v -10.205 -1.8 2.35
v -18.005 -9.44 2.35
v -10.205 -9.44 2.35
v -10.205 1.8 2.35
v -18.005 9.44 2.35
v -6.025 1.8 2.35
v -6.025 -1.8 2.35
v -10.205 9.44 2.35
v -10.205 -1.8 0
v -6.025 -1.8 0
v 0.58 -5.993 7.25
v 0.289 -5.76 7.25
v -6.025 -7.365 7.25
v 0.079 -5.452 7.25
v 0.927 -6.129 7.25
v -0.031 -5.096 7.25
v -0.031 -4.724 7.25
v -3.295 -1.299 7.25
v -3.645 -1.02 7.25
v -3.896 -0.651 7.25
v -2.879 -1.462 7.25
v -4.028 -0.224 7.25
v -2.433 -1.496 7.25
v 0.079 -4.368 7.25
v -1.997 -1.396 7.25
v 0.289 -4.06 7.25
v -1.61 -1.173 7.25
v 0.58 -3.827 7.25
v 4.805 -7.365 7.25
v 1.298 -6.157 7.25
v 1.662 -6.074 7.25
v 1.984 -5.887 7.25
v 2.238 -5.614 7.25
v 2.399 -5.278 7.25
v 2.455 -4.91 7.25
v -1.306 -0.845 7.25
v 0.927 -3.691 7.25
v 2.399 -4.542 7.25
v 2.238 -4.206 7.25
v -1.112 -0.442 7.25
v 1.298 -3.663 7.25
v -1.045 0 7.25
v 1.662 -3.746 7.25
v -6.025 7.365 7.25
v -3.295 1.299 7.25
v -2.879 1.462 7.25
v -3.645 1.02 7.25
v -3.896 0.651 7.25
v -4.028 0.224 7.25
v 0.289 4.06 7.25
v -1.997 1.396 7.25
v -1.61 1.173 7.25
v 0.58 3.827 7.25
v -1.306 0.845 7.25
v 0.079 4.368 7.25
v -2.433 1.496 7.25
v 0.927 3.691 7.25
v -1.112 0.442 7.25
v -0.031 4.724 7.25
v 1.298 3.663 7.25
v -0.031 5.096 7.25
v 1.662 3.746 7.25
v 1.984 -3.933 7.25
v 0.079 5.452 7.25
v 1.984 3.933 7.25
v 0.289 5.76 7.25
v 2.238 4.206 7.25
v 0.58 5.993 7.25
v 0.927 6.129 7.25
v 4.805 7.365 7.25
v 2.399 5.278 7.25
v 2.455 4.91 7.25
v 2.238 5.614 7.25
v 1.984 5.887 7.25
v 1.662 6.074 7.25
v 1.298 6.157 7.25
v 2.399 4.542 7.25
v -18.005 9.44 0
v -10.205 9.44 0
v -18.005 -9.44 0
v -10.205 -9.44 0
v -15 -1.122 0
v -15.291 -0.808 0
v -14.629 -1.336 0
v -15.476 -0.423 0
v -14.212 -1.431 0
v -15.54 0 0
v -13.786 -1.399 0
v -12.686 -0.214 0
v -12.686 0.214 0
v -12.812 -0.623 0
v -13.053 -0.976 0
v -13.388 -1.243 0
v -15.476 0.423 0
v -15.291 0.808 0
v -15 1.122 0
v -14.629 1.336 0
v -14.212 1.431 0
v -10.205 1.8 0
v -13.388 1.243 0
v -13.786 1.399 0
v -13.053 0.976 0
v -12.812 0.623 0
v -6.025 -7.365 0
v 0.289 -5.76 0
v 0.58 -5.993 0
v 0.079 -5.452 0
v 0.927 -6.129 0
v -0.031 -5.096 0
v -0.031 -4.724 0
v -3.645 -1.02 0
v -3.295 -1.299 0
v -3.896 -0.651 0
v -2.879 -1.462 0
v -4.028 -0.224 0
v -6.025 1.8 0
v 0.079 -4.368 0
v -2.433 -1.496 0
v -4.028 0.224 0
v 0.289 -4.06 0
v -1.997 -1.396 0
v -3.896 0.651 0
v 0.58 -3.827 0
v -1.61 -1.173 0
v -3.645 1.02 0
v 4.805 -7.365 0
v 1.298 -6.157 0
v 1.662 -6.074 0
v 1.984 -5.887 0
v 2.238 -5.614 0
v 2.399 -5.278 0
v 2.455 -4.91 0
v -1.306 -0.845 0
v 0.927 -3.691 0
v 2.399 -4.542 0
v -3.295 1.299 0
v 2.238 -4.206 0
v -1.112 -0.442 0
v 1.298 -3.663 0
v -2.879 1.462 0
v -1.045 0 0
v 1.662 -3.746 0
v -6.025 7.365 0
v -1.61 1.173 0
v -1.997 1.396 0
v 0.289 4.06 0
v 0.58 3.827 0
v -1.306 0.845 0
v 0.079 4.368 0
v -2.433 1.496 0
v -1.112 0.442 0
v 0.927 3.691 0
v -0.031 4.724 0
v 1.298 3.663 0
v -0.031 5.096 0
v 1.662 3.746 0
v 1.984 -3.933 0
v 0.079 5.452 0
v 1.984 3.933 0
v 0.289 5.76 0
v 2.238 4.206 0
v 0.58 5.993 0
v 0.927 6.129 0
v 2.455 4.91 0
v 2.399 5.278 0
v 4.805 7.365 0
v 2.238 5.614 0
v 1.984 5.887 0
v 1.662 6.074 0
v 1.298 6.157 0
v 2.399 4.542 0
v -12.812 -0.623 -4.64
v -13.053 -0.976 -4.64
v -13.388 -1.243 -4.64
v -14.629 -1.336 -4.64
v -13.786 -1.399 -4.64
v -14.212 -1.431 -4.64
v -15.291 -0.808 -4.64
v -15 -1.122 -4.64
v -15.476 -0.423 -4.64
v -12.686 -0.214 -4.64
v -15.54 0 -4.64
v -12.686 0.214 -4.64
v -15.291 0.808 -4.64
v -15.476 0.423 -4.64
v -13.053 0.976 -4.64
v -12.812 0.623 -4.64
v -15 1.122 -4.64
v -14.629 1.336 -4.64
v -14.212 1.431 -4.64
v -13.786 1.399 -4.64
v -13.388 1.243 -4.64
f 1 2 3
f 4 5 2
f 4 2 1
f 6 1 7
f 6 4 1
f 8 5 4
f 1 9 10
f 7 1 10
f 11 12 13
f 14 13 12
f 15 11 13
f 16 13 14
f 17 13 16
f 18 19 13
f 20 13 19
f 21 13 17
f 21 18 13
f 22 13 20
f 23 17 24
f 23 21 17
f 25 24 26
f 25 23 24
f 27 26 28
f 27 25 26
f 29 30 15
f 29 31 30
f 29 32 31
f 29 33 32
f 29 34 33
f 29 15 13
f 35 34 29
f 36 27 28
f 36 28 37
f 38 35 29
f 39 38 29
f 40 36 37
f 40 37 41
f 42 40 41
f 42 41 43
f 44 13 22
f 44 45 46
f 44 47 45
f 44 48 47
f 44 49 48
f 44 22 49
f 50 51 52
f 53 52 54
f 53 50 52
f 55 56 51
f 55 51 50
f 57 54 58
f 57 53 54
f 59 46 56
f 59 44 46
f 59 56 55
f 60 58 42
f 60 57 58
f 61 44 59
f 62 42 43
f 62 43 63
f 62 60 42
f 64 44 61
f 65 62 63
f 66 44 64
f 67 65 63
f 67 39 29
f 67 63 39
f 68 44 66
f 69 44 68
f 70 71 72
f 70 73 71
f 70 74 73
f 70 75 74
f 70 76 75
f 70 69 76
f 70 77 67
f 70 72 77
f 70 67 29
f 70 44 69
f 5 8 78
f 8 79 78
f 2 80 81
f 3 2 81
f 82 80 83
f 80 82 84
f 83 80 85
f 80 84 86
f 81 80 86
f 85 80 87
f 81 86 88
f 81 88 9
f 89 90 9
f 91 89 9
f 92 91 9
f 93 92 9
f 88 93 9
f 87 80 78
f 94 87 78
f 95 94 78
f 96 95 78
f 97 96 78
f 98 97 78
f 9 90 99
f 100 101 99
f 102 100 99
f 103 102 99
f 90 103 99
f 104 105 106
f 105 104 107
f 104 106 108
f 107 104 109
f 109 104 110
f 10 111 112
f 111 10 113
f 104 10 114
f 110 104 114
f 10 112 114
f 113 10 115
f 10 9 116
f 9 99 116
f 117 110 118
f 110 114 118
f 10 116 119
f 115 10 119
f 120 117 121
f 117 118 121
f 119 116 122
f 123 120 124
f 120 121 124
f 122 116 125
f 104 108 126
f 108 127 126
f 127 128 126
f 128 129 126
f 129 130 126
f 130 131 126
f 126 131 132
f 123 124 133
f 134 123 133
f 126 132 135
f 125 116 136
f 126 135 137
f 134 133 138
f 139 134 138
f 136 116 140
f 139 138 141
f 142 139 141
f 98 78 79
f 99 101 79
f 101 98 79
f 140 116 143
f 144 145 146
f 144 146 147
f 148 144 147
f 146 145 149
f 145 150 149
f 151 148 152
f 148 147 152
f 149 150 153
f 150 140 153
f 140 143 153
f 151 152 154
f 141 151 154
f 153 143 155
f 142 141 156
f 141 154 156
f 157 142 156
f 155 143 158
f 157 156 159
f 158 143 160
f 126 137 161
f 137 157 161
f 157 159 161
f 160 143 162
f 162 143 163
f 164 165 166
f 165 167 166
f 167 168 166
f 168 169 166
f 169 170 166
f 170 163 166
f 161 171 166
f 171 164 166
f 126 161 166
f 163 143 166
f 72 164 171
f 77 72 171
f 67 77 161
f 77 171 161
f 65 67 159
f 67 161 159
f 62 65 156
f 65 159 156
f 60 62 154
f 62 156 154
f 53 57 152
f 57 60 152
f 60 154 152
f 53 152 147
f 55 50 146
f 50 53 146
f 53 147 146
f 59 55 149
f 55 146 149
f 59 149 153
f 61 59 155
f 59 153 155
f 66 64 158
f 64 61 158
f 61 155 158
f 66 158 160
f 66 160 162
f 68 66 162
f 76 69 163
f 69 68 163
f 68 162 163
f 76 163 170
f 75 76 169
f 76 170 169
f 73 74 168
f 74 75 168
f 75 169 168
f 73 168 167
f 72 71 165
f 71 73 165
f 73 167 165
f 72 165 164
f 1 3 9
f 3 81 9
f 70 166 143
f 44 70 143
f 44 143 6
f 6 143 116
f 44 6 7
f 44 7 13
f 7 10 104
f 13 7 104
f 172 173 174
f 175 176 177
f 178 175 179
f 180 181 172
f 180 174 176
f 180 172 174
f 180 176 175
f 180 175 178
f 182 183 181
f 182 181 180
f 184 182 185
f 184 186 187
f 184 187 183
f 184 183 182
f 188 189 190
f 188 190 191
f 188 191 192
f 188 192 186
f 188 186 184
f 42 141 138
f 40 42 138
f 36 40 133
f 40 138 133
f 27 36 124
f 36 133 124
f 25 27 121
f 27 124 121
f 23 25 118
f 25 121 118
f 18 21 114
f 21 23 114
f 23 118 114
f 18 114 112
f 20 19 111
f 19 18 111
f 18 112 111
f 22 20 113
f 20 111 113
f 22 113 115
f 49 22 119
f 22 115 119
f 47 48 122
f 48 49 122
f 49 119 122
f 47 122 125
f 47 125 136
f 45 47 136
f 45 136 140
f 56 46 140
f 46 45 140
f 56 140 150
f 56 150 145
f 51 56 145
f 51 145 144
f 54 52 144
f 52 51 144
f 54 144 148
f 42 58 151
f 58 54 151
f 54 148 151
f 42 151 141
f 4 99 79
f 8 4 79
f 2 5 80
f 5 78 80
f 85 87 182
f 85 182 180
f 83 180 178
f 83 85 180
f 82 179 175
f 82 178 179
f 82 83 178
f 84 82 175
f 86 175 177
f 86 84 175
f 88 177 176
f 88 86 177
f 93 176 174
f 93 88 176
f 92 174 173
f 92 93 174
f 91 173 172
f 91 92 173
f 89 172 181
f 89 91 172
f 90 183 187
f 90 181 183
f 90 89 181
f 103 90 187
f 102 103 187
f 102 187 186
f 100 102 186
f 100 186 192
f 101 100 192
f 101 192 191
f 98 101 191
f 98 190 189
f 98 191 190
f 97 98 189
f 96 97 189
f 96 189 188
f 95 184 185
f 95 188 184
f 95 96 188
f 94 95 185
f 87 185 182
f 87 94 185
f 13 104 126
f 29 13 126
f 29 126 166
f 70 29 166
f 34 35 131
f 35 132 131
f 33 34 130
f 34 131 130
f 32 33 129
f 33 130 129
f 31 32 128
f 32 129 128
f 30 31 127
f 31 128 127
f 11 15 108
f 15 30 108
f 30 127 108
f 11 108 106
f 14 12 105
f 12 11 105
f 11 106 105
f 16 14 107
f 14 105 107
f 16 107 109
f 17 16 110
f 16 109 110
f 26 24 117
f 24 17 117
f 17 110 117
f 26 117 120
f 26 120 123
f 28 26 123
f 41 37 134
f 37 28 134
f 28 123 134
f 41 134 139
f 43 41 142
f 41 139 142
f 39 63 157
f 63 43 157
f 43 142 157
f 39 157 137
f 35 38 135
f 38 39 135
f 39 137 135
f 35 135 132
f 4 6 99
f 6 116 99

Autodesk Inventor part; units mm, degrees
ref_plane "YZ Plane" through (0, 0, 0) normal (1, 0, 0) x (0, 1, 0)
ref_plane "XZ Plane" through (0, 0, 0) normal (0, 1, 0) x (-1, 0, 0)
ref_plane "XY Plane" through (0, 0, 0) normal (0, 0, 1) x (1, 0, 0)
sketch "Skizze1" plane through (0, 0, 0) normal (0, 0, 1) x (1, 0, 0)
  circle A0 centre (-2.545, 0) radius 7.475 projected
  circle A1 centre (-2.545, 0) radius 1.5 projected
  circle A2 centre (1.205, -4.91) radius 1.25 projected
  circle A3 centre (1.205, 4.91) radius 1.25 projected
  line L0 (-6.025, -7.365) -> (4.805, -7.365)
  line L1 (4.805, -7.365) -> (4.805, 7.365)
  line L2 (4.805, 7.365) -> (-6.025, 7.365)
  line L3 (-6.025, 7.365) -> (-6.025, -7.365)
  line L4 (-6.025, -7.365) -> (4.805, 7.365) construction
  line L5 (4.805, -7.365) -> (-6.025, 7.365) construction
  line L6 (-10.205, -1.8) -> (-6.025, -1.8)
  line L7 (-6.025, -1.8) -> (-6.025, 1.8)
  line L8 (-6.025, 1.8) -> (-10.205, 1.8)
  line L9 (-10.205, 1.8) -> (-10.205, -1.8)
  line L10 (-10.205, -1.8) -> (-6.025, 1.8) construction
  line L11 (-6.025, -1.8) -> (-10.205, 1.8) construction
  line L12 (-18.005, -9.44) -> (-10.205, -9.44)
  line L13 (-10.205, -9.44) -> (-10.205, 9.44)
  line L14 (-10.205, 9.44) -> (-18.005, 9.44)
  line L15 (-18.005, 9.44) -> (-18.005, -9.44)
  line L16 (-18.005, -9.44) -> (-10.205, 9.44) construction
  line L17 (-10.205, -9.44) -> (-18.005, 9.44) construction
  point P0 (0, 0)
  point P1 (-0.61, 0)
  point P2 (-8.115, 0)
  point P3 (-6.025, 0)
  point P4 (-14.105, 0)
  point P5 (-10.205, 0)
  dimension "d1" = 3.6
  dimension "d2" = 14.73
  dimension "d3" = 10.83
  dimension "d4" = 4.18
  dimension "d5" = 3.6
  dimension "d6" = 18.88
  dimension "d7" = 7.8
extrude "Extrusion1" add sketch "Skizze1" along normal blind 2.35 contours L1 A0 L0 L3 L2 | A0 L2 L1 | L1 L0 A0 | A0 L3 L2 | L0 L3 A0 | L8 L3 L6 A0 | A0 L6 L9 L8 | L9 L13 L12 L15 L14
sketch "Skizze2" plane through (0, 0, 2.35) normal (0, 0, 1) x (1, 0, 0)
  line L0 (-10.205, -9.44) -> (-10.205, -1.8) projected
  line L1 (-10.205, -1.8) -> (-6.025, -1.8) projected
  line L2 (-6.025, -1.8) -> (-6.025, -7.365) projected
  line L3 (-6.025, -7.365) -> (4.805, -7.365) projected
  line L4 (4.805, -7.365) -> (4.805, 7.365) projected
  line L5 (4.805, 7.365) -> (-6.025, 7.365) projected
  line L6 (-6.025, 7.365) -> (-6.025, 1.8) projected
  line L7 (-6.025, 1.8) -> (-10.205, 1.8) projected
  line L8 (-10.205, 1.8) -> (-10.205, 9.44) projected
  line L9 (-10.205, 9.44) -> (-18.005, 9.44) projected
  line L10 (-18.005, 9.44) -> (-18.005, -9.44) projected
  line L11 (-18.005, -9.44) -> (-10.205, -9.44) projected
  circle A0 centre (1.205, 4.91) radius 1.25 projected
  circle A1 centre (1.205, -4.91) radius 1.25 projected
  circle A2 centre (-2.545, 0) radius 1.5 projected
  line L12 (-6.025, 1.8) -> (-10.205, 1.8) projected
  line L13 (-6.025, 1.8) -> (-6.025, -1.8)
  point P0 (0, 0)
extrude "Extrusion2" add sketch "Skizze2" along normal blind 4.9 contours L13 L6 L5 L4 L3 L2
sketch "Skizze3" plane through (0, 0, 0) normal (0, 0, -1) x (-1, 0, 0)
  line L0 (10.205, -9.44) -> (10.205, -1.8) projected
  line L1 (18.005, -9.44) -> (10.205, -9.44) projected
  line L2 (18.005, 9.44) -> (18.005, -9.44) projected
  line L3 (10.205, 9.44) -> (18.005, 9.44) projected
  line L4 (10.205, 1.8) -> (10.205, 9.44) projected
  line L5 (6.025, 1.8) -> (10.205, 1.8) projected
  line L6 (6.025, 7.365) -> (6.025, 1.8) projected
  line L7 (-4.805, 7.365) -> (6.025, 7.365) projected
  line L8 (-4.805, -7.365) -> (-4.805, 7.365) projected
  line L9 (6.025, -7.365) -> (-4.805, -7.365) projected
  line L10 (6.025, -1.8) -> (6.025, -7.365) projected
  line L11 (10.205, -1.8) -> (6.025, -1.8) projected
  circle A0 centre (-1.205, 4.91) radius 1.25 projected
  circle A1 centre (-1.205, -4.91) radius 1.25 projected
  circle A2 centre (2.545, 0) radius 1.5 projected
  circle A3 centre (14.105, 0) radius 1.435
  point P0 (0, 0)
  dimension "d12" = 2.87
extrude "Extrusion3" add sketch "Skizze3" along normal blind 4.64 contours A3
properties part number "00_Linear_Stepper_90mm_slide"
